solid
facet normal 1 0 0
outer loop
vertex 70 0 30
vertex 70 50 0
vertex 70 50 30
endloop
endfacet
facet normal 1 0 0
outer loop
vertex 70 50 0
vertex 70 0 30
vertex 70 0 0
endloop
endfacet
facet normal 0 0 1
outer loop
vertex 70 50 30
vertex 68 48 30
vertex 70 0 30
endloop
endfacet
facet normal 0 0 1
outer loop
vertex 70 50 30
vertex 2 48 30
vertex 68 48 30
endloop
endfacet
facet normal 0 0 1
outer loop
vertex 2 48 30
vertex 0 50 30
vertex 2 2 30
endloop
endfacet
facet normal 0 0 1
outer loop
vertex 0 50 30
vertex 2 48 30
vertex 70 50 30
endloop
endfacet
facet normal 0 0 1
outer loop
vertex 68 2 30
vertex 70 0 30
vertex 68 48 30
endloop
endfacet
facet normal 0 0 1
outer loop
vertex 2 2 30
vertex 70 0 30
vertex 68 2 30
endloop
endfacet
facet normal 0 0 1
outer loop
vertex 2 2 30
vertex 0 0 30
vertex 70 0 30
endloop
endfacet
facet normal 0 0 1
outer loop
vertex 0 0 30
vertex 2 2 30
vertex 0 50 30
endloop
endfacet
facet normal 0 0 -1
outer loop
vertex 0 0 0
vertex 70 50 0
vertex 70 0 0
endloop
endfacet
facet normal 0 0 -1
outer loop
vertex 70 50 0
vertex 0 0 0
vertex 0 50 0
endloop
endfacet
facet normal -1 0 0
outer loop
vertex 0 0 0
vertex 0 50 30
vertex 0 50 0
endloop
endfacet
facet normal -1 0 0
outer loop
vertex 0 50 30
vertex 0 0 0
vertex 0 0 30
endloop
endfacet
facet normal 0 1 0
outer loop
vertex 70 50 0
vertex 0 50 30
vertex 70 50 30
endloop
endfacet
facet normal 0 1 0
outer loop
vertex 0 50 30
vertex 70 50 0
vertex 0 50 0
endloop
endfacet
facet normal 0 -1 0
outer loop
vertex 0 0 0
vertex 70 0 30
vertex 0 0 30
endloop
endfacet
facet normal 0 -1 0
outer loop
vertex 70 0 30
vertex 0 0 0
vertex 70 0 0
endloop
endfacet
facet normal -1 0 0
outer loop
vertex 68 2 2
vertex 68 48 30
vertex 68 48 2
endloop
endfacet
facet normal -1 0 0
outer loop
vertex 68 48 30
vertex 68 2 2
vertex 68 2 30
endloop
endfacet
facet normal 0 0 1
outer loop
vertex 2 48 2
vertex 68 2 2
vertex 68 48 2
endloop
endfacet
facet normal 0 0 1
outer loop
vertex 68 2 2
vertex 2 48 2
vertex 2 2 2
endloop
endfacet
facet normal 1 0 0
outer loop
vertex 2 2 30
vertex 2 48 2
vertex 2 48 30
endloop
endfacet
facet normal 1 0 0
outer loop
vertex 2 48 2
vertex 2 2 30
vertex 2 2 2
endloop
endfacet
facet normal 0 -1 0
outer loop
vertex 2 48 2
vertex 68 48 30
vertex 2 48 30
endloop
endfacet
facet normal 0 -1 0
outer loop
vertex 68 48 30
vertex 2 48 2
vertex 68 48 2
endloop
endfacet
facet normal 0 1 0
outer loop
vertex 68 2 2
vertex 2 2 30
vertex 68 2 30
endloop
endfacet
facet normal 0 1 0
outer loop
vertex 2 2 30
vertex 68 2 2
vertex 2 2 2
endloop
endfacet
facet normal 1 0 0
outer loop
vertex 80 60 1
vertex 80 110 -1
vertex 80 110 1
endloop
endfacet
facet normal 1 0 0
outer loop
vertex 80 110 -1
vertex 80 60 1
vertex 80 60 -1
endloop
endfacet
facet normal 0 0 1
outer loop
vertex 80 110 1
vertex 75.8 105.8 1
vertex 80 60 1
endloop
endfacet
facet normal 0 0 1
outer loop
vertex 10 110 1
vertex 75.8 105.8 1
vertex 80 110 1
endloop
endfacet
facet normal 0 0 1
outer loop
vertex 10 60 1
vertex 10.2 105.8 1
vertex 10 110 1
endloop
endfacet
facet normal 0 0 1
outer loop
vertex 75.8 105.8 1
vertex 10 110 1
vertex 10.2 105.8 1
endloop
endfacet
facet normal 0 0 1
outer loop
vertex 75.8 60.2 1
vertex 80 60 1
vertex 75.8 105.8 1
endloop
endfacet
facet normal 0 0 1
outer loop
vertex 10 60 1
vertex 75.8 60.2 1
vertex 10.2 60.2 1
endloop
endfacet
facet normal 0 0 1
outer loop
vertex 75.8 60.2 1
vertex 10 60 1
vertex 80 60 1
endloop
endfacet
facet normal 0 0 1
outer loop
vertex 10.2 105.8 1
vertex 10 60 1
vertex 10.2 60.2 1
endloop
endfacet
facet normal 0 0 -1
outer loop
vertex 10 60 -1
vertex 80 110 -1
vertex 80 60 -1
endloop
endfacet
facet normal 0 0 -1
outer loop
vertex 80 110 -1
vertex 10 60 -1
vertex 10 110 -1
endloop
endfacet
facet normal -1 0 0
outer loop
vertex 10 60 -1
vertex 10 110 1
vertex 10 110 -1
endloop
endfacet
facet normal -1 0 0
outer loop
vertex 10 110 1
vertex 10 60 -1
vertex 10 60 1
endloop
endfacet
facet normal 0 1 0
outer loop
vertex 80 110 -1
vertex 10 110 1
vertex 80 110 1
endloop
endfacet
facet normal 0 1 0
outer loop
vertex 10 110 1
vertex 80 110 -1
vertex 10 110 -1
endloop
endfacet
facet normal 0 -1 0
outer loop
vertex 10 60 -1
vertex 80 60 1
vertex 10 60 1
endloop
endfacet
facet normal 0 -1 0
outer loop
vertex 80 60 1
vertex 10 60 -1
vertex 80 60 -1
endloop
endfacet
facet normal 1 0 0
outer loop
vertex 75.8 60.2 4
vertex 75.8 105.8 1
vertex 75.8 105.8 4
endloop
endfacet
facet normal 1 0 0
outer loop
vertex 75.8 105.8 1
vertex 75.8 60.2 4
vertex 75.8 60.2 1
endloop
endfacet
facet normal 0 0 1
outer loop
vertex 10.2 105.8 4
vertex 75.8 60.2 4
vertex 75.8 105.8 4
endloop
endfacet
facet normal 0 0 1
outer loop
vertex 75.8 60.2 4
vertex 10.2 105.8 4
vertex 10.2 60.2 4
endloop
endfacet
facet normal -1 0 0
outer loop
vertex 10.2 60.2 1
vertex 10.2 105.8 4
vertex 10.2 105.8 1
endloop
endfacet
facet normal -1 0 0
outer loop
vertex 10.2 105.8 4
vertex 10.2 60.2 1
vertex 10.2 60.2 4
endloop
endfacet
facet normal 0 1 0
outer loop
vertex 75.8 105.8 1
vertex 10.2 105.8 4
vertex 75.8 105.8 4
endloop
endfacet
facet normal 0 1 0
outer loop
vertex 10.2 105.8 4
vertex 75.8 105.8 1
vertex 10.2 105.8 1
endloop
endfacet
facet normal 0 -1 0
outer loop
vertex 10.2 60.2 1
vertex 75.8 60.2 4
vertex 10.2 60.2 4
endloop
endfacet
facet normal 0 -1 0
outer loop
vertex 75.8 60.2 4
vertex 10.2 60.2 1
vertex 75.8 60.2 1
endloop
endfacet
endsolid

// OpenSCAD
// Two-part enclosure for small electronics board
// Print orientation: both parts on the bed, lid on +X side of box

// ---- Box ----
box_x = 70;      // outer length (X)
box_y = 50;      // outer width (Y)
box_z = 30;      // outer height (Z)
wall = 2;        // wall thickness
floor = 2;       // floor thickness

// ---- Lid ----
lip_w = 65.6;    // lip outer length (X)
lip_d = 45.6;    // lip outer width (Y)
lip_h = 4;       // lip height (Z)
lip_t = 1.5;     // lip wall thickness

// ---- Misc ----
eps = 0.5;       // cutter overshoot
gap = 10;        // gap between parts

$fn = 64;

lip_r = (lip_w - box_x + 2 * wall) / 2;  // clearance per side (X)
lip_d_r = (lip_d - box_y + 2 * wall) / 2; // clearance per side (Y)

module box() {
    difference() {
        cube([box_x, box_y, box_z]);
        translate([wall, wall, floor])
            cube([box_x - 2 * wall, box_y - 2 * wall, box_z - floor]);
    }
}

module lid() {
    translate([gap, 0, 0])
        union() {
            // base plate
            translate([0, 0, -1])
                cube([box_x, box_y, 2]);
            // lip (printed upside down, overhangs the plate)
            translate([-lip_r, -lip_d_r, 0])
                cube([lip_w, lip_d, lip_h]);
        }
}

box();
translate([0, box_y + gap, 0])
    lid();
